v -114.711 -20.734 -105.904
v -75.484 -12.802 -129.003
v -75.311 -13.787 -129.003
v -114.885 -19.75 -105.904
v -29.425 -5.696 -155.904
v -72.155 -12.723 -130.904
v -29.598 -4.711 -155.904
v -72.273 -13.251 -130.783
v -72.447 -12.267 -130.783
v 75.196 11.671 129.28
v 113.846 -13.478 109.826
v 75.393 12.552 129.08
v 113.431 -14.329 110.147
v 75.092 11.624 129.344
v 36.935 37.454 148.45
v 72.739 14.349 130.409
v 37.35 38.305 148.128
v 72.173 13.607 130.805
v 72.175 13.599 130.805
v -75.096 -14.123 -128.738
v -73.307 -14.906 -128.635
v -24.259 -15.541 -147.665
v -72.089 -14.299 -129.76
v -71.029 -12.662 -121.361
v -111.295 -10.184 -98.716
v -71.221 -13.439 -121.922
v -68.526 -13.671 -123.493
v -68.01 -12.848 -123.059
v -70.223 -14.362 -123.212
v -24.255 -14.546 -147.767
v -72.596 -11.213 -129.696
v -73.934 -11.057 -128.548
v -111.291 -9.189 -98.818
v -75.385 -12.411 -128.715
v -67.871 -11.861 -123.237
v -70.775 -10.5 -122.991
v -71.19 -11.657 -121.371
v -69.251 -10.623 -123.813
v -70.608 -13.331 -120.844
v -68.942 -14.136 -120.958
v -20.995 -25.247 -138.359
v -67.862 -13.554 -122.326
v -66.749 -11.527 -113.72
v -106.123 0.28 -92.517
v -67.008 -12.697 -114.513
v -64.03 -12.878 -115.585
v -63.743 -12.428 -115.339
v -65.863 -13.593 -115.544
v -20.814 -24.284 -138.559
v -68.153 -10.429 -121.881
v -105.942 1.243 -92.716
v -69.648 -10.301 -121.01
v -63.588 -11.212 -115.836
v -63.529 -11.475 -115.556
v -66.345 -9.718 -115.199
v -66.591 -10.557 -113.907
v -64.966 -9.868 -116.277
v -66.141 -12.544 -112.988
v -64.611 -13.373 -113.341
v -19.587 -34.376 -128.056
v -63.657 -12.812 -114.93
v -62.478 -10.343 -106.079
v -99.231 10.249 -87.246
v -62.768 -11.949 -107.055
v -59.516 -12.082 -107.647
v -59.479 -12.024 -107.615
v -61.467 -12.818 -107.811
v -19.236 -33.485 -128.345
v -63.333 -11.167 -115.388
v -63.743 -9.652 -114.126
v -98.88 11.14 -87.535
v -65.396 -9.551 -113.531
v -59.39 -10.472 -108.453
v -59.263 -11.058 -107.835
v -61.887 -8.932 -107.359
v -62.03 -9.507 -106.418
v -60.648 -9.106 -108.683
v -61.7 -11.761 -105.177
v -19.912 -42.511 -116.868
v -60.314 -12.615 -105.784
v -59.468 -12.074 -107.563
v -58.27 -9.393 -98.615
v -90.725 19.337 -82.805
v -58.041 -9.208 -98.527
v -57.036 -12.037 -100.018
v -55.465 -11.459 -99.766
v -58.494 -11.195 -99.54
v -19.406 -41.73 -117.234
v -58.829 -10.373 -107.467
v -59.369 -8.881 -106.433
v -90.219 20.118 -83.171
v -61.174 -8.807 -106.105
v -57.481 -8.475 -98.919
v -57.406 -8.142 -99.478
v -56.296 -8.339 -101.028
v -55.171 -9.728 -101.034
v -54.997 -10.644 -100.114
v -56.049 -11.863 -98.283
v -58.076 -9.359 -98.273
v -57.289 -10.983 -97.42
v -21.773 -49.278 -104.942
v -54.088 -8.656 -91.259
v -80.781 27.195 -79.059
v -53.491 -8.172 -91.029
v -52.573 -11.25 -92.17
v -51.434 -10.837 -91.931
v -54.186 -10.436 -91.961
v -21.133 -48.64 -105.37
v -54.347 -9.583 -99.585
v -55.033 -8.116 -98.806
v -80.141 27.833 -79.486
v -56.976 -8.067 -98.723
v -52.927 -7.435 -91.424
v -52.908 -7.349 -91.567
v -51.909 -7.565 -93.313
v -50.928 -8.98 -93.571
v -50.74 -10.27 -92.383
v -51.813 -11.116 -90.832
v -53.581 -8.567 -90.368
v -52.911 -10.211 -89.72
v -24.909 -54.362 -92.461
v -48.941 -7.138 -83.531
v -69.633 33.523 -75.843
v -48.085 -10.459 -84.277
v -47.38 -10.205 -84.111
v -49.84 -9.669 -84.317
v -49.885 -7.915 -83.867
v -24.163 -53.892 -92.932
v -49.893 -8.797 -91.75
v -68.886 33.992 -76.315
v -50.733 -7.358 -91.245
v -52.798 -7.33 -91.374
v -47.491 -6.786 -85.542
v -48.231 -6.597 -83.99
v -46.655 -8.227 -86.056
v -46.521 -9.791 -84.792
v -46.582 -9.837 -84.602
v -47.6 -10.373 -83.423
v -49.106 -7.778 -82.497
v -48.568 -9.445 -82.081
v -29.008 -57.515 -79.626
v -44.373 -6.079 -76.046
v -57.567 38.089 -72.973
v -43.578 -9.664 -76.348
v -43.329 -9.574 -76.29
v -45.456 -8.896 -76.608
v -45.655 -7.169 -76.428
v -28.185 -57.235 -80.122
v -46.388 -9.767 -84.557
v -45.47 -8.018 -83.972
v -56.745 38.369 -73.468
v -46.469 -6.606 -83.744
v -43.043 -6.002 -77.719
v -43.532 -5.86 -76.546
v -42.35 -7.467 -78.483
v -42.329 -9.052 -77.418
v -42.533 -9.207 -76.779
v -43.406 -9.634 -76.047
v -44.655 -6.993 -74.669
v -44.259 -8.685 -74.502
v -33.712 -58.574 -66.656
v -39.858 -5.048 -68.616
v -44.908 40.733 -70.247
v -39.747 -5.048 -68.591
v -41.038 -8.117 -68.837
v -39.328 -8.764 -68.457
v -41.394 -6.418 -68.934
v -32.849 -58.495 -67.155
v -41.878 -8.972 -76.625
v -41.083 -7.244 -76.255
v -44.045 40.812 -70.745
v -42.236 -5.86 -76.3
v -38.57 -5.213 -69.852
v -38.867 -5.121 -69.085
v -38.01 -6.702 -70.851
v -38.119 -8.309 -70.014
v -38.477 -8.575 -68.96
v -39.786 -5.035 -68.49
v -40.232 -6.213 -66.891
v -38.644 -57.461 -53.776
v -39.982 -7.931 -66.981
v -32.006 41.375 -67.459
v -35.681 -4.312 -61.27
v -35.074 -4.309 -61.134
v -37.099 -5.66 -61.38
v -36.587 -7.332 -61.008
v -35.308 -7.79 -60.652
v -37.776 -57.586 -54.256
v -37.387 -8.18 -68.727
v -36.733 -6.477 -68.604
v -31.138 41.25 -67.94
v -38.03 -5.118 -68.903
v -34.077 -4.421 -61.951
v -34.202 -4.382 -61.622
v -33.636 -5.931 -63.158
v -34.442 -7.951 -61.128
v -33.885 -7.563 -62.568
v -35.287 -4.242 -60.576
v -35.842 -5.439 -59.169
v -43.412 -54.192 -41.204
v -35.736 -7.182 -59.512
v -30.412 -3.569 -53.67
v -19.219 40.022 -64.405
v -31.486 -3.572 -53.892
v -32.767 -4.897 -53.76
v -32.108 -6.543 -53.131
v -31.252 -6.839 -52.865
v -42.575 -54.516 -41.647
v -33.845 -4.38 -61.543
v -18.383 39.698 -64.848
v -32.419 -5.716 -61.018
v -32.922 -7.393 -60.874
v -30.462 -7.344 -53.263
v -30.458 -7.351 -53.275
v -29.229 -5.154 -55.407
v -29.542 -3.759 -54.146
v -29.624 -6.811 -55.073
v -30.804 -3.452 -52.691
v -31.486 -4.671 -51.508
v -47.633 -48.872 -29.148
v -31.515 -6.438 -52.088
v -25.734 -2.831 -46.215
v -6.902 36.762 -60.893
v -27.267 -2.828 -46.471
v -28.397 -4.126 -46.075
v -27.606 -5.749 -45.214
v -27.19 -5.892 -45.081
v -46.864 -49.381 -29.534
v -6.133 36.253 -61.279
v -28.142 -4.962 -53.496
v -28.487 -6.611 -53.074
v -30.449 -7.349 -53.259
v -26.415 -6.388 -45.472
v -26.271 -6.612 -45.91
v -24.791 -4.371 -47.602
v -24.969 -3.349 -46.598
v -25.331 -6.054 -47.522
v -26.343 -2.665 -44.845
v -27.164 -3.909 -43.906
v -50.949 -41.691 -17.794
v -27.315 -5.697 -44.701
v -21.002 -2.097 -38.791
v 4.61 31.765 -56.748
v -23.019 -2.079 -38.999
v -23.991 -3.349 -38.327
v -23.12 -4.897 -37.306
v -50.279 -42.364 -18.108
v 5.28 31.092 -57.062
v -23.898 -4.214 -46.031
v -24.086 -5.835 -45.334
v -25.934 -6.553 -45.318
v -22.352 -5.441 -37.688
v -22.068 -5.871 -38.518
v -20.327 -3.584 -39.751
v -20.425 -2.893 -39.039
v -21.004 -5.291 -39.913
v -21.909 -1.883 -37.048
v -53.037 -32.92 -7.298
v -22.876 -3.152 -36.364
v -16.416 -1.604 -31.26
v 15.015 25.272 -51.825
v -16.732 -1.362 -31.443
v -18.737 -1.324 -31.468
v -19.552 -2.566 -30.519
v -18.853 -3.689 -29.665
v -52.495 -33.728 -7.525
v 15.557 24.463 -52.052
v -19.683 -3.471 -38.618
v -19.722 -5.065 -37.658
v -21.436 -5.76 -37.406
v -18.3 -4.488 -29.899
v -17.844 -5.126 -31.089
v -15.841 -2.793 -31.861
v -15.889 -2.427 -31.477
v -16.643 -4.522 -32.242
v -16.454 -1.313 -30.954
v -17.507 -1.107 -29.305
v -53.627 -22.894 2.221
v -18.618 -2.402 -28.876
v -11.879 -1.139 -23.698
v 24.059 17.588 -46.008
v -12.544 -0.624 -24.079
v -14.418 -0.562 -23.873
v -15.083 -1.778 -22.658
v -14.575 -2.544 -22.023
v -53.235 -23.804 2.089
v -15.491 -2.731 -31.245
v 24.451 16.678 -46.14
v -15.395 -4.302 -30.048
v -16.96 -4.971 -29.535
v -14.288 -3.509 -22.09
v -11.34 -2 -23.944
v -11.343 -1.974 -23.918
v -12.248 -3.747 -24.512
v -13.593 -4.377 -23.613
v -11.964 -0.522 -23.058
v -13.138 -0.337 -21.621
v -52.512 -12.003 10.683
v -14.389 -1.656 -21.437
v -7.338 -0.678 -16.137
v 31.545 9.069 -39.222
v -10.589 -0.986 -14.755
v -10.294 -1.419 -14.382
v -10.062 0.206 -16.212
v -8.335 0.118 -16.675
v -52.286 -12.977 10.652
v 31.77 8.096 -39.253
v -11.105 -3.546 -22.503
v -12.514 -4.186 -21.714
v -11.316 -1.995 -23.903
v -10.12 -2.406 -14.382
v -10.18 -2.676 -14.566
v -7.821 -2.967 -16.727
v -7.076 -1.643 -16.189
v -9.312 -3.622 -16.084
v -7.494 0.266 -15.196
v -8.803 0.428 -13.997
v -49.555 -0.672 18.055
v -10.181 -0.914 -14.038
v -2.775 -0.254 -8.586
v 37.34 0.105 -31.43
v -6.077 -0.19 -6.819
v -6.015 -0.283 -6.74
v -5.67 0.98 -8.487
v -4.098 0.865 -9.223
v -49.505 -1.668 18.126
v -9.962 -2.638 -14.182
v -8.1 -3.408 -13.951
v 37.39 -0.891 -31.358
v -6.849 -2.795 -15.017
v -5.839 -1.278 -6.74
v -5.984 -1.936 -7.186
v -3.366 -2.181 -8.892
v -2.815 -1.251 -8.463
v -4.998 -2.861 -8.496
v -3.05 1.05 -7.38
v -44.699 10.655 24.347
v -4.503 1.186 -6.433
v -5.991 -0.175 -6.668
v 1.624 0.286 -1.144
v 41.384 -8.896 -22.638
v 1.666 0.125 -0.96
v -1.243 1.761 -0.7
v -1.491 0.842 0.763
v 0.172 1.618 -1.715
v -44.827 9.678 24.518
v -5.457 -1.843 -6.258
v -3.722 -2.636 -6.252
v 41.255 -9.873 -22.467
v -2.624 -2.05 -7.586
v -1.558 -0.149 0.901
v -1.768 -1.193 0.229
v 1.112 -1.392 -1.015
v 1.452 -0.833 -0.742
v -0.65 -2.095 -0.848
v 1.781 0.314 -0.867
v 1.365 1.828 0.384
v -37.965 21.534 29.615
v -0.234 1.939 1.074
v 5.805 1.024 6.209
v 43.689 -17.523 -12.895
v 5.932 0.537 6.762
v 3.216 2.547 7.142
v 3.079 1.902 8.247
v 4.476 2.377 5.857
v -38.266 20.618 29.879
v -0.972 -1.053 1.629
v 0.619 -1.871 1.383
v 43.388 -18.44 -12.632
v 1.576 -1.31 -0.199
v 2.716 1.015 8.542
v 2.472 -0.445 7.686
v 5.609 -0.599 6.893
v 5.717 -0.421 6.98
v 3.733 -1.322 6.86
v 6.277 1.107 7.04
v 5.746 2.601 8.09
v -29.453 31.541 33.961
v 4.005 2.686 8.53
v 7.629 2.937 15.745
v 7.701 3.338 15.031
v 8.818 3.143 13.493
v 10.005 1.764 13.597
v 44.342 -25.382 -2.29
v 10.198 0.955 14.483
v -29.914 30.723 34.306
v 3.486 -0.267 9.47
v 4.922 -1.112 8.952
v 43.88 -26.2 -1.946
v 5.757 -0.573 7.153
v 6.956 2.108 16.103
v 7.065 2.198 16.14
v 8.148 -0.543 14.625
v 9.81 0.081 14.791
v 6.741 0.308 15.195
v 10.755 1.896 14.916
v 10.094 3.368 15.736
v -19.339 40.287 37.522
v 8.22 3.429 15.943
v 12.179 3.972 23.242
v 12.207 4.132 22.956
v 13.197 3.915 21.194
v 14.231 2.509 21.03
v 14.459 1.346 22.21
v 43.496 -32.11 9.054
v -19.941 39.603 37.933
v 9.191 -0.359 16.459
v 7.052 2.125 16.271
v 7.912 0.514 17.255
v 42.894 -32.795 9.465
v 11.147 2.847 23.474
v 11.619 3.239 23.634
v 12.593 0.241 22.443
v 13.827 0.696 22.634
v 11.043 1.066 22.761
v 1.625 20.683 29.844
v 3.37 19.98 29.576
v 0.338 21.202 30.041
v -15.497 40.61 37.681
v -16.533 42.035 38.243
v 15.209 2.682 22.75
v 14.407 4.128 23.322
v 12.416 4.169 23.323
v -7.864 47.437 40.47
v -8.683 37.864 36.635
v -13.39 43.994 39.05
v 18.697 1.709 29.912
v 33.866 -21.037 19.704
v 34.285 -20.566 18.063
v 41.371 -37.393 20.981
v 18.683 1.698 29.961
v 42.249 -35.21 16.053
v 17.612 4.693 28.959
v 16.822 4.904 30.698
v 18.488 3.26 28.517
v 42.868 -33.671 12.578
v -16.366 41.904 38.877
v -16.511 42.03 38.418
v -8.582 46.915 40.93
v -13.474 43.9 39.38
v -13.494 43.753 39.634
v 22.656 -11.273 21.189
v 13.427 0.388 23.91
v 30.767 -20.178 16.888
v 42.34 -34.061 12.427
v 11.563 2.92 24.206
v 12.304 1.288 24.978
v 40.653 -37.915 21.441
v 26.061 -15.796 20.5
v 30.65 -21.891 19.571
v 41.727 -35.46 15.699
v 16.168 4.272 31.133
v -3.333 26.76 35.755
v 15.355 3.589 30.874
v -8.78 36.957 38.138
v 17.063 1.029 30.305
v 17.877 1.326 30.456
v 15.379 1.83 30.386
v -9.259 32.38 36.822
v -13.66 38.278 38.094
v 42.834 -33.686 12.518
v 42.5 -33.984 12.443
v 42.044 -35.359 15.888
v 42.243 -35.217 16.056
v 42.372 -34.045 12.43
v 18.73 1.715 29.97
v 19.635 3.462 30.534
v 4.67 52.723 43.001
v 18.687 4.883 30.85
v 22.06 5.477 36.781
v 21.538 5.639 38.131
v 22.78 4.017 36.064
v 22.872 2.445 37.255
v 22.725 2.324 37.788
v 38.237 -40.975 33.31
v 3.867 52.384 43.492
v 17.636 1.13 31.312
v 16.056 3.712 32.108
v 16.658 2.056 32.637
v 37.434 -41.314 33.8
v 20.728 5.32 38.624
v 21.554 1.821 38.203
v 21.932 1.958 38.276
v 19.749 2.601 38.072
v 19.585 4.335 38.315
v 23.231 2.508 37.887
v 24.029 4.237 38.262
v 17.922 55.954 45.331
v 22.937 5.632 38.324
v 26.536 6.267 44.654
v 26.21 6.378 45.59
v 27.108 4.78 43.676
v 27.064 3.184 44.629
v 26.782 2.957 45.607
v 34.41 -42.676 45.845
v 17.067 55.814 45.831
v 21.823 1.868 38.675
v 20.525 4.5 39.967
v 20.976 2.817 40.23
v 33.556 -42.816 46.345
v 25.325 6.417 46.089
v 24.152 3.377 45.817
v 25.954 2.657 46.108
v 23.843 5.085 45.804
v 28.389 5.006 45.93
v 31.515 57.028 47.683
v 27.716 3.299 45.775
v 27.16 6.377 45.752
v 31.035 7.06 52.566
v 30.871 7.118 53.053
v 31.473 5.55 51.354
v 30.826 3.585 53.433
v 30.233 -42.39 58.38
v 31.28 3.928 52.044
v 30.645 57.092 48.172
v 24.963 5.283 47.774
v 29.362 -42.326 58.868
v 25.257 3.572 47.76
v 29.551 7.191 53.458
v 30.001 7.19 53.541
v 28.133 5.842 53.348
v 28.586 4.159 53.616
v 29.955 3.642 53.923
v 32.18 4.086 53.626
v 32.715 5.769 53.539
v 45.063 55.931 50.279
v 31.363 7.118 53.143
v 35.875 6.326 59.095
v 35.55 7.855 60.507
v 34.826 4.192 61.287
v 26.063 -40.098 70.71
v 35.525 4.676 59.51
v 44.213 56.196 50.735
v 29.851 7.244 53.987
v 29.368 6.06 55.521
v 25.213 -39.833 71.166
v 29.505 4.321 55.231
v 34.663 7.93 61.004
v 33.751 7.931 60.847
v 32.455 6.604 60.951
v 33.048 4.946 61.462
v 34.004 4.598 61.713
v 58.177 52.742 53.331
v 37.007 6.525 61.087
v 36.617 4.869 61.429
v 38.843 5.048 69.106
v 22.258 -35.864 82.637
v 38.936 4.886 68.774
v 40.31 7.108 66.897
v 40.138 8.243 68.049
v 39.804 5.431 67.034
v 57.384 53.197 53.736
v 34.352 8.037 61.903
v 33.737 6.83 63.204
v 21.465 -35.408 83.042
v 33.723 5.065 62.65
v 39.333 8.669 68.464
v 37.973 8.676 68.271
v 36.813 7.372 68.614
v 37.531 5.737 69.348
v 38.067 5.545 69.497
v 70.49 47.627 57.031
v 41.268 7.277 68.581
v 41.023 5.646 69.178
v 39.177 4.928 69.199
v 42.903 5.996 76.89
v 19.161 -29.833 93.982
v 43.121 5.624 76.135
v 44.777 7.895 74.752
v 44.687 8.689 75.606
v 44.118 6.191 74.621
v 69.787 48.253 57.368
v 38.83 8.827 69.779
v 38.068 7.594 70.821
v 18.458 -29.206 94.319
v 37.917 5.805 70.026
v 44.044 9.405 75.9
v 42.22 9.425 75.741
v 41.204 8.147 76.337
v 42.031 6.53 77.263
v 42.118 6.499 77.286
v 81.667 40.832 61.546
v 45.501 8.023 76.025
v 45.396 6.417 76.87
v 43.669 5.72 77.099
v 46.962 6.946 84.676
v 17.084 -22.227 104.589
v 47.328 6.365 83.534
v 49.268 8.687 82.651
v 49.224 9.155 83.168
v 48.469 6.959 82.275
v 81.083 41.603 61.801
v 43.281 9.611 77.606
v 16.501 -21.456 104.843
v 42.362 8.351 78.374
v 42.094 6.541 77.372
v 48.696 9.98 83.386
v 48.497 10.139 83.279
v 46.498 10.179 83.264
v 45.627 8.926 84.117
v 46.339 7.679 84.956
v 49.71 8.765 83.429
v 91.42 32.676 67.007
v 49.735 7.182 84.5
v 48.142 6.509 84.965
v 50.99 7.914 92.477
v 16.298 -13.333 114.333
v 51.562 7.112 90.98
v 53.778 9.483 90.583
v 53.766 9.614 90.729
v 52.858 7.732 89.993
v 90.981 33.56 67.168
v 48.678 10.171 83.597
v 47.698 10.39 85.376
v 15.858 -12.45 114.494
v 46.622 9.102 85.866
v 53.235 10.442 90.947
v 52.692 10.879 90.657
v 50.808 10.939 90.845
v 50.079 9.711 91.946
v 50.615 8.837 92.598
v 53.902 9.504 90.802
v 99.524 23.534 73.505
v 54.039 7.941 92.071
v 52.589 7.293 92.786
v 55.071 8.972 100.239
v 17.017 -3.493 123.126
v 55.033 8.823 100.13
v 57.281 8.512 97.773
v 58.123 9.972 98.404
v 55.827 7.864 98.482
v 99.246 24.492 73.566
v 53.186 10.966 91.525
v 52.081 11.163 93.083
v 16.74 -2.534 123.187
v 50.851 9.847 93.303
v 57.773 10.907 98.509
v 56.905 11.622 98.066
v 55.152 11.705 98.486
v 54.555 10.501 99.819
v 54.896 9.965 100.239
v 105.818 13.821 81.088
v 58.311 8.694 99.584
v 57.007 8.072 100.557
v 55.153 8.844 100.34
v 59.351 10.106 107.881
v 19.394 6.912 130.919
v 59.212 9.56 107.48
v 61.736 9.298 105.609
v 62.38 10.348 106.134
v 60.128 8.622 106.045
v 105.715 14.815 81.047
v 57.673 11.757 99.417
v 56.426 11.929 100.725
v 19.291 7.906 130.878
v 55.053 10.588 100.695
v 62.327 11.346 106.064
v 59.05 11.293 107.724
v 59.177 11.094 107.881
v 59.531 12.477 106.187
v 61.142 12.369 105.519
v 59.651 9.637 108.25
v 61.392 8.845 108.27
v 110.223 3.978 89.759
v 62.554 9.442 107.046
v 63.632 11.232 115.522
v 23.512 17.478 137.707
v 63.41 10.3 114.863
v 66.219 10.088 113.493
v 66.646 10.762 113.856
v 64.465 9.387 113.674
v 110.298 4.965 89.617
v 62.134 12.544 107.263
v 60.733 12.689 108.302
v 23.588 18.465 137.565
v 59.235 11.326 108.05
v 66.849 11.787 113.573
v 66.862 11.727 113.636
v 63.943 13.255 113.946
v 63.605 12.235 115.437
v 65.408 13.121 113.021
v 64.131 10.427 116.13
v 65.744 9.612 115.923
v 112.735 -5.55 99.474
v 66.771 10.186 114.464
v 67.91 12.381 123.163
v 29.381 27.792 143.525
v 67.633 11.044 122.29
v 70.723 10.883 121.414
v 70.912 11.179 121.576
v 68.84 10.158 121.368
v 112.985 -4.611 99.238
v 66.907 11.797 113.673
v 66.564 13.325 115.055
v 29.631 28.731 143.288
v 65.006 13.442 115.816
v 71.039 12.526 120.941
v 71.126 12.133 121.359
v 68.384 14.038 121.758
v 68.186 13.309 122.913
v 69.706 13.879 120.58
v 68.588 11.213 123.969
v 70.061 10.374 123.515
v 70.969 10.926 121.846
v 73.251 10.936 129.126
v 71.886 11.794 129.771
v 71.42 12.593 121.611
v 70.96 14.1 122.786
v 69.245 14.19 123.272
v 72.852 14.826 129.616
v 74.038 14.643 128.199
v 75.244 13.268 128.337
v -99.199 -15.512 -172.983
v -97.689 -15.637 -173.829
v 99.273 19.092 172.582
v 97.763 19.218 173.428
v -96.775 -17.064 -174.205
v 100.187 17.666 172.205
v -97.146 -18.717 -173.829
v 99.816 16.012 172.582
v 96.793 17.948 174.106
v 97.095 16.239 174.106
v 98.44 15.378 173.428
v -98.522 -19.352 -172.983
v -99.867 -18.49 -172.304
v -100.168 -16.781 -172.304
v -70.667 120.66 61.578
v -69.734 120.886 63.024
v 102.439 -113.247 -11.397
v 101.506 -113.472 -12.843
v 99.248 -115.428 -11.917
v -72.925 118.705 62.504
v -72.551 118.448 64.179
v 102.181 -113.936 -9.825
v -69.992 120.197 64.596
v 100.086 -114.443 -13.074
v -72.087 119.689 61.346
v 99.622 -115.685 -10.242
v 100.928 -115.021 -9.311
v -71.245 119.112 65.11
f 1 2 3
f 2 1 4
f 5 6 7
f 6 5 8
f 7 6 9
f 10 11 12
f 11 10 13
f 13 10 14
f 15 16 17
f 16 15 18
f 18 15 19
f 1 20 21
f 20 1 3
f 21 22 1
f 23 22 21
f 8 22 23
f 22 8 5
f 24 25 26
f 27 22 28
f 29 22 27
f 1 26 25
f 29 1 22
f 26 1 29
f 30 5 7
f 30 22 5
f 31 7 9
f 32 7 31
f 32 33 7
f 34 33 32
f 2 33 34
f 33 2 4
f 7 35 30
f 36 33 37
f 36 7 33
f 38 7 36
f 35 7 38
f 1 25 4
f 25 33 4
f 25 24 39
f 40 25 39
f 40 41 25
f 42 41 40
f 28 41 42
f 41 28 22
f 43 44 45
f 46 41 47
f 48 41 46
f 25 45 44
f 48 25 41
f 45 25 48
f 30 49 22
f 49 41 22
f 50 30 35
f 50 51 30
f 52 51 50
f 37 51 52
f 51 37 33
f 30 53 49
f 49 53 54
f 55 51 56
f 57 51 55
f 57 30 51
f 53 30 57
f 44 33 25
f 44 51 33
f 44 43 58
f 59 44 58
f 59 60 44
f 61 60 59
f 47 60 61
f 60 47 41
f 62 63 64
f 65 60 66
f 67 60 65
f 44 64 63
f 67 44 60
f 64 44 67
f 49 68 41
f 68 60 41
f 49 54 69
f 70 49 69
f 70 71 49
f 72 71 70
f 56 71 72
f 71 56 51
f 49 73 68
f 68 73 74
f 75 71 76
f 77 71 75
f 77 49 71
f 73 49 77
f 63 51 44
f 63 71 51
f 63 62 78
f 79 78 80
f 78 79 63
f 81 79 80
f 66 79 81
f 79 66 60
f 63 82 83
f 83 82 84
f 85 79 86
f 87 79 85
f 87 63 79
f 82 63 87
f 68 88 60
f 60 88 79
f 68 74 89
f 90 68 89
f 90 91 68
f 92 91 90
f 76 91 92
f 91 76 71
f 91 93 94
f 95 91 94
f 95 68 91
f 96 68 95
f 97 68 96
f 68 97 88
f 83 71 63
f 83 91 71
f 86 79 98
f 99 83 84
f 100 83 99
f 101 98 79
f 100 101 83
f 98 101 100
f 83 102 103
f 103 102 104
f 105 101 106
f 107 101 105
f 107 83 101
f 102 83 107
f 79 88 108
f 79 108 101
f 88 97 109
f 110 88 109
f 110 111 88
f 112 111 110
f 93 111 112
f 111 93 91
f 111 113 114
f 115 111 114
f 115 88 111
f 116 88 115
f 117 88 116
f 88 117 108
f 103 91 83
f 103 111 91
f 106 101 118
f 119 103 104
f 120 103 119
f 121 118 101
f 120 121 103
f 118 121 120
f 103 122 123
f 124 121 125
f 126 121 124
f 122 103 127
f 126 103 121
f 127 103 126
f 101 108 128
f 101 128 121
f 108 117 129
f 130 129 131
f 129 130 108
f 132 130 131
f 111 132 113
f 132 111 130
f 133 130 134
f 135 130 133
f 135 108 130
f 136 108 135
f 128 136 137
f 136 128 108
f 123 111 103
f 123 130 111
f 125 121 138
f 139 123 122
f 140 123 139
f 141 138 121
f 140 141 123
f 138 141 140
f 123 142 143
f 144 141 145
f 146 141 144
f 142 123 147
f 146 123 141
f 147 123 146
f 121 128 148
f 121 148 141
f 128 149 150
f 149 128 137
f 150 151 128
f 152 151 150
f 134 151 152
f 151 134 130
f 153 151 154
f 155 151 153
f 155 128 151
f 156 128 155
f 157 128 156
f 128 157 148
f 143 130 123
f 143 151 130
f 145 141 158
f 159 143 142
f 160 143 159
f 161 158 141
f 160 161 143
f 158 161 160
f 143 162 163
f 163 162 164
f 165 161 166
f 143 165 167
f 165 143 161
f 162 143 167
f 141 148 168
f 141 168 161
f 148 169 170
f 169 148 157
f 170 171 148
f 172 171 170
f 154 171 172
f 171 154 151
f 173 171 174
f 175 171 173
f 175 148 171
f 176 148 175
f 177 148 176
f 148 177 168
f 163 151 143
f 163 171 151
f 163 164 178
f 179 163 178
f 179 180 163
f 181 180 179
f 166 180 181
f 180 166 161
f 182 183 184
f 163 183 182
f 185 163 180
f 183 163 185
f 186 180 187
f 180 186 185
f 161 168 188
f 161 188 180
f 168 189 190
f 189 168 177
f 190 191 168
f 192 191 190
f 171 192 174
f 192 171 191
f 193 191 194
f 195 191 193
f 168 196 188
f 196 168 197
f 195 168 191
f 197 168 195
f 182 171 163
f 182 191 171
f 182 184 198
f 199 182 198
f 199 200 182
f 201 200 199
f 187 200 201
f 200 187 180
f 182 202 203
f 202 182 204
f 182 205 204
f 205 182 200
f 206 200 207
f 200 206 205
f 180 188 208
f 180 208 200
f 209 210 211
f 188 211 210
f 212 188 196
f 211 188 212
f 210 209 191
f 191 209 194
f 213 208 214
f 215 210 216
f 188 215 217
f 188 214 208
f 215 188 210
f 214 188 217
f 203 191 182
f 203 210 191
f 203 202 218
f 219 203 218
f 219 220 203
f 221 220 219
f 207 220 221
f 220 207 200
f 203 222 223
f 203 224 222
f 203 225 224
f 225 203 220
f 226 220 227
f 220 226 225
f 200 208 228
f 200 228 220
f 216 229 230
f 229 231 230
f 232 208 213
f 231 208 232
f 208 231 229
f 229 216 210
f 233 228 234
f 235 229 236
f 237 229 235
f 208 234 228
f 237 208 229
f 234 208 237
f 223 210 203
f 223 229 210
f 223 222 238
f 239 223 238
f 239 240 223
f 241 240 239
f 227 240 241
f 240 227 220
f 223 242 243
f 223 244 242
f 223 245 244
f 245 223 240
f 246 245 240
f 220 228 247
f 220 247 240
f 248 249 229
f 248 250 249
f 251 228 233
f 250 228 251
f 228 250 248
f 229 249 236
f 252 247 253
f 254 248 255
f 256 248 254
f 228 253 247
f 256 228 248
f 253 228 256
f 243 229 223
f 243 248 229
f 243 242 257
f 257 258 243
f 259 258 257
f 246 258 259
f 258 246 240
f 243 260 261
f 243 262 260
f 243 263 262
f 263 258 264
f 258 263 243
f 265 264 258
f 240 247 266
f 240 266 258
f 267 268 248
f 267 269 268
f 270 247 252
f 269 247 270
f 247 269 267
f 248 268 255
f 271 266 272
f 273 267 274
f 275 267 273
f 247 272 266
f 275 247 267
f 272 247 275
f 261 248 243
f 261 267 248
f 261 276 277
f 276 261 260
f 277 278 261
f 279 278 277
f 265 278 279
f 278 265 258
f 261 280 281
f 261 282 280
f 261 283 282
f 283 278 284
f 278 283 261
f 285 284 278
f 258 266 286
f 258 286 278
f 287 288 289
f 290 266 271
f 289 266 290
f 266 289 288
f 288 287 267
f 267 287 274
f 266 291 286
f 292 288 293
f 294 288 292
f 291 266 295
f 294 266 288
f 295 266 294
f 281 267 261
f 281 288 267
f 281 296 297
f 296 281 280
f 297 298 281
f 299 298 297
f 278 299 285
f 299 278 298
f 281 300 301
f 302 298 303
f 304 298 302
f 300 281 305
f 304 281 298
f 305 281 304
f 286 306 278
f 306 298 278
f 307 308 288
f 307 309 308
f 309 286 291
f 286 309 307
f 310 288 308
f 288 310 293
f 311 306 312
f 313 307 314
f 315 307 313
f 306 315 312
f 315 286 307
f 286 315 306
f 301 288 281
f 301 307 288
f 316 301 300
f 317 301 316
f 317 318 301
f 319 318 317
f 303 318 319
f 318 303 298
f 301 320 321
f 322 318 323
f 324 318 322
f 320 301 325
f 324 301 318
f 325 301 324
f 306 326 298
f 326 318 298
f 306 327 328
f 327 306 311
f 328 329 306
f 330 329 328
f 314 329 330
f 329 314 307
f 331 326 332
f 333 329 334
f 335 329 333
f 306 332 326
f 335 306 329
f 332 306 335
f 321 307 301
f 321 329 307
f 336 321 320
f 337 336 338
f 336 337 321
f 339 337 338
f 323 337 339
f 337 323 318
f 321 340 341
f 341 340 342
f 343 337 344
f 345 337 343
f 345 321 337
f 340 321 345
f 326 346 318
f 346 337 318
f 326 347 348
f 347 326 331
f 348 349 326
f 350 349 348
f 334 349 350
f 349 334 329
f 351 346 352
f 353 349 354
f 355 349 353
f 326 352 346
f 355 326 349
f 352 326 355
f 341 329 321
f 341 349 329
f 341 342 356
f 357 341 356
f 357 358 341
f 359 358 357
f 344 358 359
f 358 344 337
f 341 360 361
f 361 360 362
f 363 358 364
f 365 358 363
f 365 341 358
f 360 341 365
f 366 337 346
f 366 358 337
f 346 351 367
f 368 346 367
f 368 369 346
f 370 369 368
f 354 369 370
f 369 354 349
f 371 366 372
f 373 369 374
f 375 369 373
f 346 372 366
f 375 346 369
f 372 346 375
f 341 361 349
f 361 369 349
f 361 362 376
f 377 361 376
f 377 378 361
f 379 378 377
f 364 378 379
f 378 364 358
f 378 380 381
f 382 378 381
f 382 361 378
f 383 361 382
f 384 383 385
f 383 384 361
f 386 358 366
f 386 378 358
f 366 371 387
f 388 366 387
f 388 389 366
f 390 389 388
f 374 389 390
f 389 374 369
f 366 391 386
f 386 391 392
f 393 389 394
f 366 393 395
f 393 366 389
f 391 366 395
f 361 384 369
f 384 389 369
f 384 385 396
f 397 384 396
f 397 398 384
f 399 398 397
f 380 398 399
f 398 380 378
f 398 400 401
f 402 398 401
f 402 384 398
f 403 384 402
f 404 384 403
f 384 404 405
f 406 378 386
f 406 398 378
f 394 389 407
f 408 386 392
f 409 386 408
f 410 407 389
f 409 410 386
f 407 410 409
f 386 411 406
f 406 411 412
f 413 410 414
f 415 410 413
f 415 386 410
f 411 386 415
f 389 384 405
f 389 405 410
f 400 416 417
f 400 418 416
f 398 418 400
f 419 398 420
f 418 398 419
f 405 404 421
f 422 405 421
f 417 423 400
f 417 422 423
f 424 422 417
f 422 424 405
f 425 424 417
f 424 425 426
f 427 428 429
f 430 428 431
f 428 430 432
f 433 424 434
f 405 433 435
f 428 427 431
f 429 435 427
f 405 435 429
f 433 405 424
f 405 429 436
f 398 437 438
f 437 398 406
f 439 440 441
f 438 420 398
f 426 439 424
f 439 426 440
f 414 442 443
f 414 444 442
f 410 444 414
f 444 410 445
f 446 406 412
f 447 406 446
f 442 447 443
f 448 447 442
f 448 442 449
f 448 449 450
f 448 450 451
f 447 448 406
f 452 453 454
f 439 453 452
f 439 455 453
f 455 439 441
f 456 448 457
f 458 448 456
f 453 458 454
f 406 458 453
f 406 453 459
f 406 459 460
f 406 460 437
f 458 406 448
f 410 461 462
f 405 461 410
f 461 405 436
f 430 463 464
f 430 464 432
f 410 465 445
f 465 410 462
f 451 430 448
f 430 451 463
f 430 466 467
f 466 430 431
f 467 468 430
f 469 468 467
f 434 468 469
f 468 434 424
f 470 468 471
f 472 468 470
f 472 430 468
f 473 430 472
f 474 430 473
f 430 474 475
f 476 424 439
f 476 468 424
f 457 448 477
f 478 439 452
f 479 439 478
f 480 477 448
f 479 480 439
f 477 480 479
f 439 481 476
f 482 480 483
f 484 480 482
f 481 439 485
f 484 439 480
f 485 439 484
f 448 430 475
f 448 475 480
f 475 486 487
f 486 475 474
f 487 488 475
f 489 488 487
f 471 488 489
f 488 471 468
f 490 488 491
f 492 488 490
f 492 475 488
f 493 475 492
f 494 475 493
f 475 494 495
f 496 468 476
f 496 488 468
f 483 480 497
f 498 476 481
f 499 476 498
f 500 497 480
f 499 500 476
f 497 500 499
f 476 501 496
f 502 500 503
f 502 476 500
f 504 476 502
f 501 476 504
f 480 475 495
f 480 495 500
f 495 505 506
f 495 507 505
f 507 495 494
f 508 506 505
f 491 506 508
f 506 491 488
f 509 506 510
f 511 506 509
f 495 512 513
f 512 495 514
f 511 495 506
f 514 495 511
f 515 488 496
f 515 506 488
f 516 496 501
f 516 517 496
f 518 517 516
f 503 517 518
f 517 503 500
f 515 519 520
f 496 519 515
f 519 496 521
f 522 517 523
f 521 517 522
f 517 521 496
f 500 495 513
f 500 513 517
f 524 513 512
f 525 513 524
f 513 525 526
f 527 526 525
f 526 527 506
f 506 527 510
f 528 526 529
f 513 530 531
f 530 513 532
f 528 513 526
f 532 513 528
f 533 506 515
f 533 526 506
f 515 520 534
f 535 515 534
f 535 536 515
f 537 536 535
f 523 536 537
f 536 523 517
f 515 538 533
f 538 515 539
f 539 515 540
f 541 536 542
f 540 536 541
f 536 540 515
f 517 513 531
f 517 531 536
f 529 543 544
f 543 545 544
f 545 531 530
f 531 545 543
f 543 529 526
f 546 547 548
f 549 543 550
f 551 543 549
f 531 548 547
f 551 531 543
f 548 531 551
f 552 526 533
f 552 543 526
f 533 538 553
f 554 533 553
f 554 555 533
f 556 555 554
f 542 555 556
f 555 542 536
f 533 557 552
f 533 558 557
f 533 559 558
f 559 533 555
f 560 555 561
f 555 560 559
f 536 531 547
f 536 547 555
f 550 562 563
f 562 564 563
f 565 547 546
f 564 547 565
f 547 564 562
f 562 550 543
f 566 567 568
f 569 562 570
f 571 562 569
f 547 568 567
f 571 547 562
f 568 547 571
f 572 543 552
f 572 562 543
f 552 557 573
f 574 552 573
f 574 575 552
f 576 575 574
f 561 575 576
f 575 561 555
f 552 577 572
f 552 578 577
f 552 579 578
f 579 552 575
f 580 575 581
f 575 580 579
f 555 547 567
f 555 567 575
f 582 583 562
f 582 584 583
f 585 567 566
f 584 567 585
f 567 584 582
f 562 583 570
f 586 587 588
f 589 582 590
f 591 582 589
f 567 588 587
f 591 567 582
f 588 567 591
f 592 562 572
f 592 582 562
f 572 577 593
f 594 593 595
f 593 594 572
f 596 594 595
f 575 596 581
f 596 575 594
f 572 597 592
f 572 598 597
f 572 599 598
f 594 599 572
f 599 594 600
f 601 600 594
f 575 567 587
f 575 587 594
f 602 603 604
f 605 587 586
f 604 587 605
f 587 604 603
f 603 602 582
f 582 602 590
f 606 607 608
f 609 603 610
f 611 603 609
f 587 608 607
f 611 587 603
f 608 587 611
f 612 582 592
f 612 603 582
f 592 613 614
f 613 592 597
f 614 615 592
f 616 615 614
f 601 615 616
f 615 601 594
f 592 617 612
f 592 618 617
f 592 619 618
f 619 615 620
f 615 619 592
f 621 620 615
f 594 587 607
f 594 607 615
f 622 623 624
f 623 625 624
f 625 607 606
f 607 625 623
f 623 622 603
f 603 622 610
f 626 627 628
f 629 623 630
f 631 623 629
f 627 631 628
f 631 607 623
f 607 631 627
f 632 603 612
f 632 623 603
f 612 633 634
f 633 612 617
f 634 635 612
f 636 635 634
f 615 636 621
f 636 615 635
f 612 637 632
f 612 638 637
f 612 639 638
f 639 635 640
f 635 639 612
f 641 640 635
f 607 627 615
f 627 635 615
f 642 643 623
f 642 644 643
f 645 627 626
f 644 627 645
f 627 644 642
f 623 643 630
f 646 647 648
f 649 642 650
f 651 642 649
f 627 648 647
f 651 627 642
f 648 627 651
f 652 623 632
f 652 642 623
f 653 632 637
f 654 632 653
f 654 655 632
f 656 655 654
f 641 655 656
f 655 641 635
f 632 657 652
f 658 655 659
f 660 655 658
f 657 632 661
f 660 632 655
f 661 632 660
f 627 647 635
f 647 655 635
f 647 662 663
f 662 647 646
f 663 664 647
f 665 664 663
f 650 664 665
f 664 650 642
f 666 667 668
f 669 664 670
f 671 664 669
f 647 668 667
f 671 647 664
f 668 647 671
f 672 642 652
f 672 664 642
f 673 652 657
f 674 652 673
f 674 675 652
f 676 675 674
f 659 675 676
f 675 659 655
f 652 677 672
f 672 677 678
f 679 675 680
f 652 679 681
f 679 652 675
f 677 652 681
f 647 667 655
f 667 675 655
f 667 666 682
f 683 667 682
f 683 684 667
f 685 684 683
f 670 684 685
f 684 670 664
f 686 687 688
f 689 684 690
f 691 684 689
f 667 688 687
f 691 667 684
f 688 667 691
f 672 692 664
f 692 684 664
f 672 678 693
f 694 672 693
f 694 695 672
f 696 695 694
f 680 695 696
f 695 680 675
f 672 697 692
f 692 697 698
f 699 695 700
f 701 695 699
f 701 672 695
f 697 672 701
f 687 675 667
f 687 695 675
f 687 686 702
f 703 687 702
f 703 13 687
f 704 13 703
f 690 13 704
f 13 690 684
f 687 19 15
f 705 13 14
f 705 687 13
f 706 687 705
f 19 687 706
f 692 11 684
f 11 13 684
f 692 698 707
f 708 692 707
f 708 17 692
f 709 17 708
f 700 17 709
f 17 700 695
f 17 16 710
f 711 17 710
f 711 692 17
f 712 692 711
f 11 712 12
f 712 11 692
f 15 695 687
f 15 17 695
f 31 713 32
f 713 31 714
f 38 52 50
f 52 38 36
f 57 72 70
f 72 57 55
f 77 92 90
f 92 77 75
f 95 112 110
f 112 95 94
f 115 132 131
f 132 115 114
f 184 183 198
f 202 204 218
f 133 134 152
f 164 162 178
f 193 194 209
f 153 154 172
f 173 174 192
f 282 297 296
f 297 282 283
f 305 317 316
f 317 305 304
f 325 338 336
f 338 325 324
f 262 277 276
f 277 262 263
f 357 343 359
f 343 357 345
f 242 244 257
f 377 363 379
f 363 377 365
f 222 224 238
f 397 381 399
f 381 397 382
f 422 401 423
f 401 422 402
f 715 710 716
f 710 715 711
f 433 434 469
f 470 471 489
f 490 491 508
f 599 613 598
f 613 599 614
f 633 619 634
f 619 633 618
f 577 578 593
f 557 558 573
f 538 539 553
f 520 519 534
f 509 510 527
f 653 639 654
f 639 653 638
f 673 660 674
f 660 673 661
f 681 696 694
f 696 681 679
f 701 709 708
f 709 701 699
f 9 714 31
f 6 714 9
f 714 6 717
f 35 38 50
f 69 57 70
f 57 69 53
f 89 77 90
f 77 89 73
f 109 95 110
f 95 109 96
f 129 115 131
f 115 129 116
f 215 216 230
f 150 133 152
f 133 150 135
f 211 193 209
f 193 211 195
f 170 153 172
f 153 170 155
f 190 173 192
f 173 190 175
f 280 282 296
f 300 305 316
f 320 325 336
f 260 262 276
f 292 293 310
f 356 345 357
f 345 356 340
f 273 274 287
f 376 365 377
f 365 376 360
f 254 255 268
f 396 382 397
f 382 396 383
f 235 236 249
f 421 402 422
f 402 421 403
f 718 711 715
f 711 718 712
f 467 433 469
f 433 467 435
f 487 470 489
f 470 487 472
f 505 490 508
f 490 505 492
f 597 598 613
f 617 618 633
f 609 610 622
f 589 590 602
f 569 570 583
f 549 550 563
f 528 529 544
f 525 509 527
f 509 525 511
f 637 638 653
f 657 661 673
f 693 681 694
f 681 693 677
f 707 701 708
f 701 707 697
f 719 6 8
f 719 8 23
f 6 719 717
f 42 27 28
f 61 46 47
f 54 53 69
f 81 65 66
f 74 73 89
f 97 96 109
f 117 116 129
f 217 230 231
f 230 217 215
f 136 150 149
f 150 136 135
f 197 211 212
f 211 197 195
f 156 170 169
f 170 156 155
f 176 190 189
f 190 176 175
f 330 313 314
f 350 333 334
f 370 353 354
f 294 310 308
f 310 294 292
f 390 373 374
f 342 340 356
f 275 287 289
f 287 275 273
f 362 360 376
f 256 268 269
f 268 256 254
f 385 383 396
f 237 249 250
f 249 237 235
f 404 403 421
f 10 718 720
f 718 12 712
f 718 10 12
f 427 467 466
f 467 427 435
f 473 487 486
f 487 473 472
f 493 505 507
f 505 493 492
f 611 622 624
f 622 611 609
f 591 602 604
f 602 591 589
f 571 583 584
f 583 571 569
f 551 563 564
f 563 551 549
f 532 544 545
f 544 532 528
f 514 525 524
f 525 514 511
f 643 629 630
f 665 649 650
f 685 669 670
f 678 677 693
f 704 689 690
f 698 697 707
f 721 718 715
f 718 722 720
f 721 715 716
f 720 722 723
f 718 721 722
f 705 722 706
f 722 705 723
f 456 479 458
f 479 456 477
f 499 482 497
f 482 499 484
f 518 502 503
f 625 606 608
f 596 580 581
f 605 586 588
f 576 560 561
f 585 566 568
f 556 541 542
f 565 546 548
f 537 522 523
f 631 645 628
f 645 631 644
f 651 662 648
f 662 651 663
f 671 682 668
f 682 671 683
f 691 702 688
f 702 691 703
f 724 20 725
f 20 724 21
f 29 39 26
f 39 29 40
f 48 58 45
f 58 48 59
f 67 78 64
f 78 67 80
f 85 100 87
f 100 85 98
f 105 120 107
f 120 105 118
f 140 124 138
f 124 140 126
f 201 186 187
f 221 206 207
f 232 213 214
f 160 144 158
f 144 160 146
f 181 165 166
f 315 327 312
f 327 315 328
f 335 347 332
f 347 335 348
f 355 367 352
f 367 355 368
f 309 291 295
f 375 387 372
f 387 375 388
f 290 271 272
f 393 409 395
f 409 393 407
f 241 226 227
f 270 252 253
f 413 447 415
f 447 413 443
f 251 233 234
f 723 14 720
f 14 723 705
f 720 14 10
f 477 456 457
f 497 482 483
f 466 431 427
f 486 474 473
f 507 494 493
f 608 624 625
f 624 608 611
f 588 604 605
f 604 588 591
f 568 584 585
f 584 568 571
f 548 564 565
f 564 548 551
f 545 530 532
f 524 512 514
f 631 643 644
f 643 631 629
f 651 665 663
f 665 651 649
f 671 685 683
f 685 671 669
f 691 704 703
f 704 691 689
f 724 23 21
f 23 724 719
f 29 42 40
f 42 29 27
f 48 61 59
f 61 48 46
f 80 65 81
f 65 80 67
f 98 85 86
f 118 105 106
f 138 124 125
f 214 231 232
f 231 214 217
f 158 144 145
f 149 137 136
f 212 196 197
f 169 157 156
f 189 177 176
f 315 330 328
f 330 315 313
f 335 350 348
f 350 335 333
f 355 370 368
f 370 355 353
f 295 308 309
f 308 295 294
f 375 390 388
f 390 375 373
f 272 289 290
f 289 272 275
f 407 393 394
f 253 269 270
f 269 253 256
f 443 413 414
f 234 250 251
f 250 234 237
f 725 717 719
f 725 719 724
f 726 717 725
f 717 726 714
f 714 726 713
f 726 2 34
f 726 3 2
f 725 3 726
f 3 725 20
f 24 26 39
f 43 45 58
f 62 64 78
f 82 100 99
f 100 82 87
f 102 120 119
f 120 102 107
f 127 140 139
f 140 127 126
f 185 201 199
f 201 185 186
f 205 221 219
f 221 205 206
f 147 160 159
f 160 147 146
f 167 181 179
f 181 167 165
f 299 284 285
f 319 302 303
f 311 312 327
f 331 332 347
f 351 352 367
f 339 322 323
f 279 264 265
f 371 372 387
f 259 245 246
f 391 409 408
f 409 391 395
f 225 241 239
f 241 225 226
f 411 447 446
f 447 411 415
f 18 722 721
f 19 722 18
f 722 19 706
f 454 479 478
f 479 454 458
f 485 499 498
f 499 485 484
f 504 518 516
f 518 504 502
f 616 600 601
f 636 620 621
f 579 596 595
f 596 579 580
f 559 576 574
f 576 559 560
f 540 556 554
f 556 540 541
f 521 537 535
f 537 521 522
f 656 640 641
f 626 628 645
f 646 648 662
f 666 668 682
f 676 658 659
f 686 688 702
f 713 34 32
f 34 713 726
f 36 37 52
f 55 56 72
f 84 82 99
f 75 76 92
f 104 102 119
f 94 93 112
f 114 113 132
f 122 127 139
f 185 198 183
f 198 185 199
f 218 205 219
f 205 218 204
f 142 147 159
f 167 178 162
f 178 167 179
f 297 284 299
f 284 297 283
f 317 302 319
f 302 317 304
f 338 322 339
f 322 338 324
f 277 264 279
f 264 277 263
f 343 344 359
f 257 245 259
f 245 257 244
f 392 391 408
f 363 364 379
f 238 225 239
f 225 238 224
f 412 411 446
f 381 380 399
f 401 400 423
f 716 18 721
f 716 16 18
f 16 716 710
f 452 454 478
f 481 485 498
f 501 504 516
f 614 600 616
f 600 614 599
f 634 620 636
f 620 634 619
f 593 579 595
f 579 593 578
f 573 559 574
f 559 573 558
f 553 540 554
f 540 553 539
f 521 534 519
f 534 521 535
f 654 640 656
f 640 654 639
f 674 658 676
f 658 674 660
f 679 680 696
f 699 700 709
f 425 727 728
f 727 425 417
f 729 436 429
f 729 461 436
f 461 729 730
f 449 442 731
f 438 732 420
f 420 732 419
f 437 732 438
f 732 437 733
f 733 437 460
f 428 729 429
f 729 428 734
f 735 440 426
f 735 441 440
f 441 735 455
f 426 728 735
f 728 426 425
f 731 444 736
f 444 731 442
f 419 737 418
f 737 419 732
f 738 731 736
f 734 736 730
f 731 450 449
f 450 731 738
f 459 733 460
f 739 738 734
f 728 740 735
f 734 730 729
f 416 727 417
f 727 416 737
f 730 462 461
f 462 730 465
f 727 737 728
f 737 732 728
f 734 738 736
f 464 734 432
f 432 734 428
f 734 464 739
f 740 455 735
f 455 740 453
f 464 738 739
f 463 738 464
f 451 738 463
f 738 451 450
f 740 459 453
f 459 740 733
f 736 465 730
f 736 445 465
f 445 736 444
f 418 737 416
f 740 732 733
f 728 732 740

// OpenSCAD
// This indicates the helical
// joint-primitive constraint. 
// 
// First the in-line and parallel constraints 
// are met, thus constructing an axis.
// Then the twist about the axis defines the 
// possible positions.
// The line in the green lies on the helical
// surface of the red.
//

// parameters

// renders

color("red", 0.25){
 rotate([0,30,10]) {
   translate([0,0,-150])
	linear_extrude(height=300, center=false, 
			convexity=10, twist=400) {
	  translate([2,0,0])
	    square([100,1],true); } 

   cylinder(400, 2,2, true);
}}

color("green", 0.25){
  rotate([0,30,10]) {
    translate([0,0,30])
    rotate(90, [7,4,0])
      cylinder(300, 2,2, true);
    cylinder(400, 2,2, true);
}}


// modules
